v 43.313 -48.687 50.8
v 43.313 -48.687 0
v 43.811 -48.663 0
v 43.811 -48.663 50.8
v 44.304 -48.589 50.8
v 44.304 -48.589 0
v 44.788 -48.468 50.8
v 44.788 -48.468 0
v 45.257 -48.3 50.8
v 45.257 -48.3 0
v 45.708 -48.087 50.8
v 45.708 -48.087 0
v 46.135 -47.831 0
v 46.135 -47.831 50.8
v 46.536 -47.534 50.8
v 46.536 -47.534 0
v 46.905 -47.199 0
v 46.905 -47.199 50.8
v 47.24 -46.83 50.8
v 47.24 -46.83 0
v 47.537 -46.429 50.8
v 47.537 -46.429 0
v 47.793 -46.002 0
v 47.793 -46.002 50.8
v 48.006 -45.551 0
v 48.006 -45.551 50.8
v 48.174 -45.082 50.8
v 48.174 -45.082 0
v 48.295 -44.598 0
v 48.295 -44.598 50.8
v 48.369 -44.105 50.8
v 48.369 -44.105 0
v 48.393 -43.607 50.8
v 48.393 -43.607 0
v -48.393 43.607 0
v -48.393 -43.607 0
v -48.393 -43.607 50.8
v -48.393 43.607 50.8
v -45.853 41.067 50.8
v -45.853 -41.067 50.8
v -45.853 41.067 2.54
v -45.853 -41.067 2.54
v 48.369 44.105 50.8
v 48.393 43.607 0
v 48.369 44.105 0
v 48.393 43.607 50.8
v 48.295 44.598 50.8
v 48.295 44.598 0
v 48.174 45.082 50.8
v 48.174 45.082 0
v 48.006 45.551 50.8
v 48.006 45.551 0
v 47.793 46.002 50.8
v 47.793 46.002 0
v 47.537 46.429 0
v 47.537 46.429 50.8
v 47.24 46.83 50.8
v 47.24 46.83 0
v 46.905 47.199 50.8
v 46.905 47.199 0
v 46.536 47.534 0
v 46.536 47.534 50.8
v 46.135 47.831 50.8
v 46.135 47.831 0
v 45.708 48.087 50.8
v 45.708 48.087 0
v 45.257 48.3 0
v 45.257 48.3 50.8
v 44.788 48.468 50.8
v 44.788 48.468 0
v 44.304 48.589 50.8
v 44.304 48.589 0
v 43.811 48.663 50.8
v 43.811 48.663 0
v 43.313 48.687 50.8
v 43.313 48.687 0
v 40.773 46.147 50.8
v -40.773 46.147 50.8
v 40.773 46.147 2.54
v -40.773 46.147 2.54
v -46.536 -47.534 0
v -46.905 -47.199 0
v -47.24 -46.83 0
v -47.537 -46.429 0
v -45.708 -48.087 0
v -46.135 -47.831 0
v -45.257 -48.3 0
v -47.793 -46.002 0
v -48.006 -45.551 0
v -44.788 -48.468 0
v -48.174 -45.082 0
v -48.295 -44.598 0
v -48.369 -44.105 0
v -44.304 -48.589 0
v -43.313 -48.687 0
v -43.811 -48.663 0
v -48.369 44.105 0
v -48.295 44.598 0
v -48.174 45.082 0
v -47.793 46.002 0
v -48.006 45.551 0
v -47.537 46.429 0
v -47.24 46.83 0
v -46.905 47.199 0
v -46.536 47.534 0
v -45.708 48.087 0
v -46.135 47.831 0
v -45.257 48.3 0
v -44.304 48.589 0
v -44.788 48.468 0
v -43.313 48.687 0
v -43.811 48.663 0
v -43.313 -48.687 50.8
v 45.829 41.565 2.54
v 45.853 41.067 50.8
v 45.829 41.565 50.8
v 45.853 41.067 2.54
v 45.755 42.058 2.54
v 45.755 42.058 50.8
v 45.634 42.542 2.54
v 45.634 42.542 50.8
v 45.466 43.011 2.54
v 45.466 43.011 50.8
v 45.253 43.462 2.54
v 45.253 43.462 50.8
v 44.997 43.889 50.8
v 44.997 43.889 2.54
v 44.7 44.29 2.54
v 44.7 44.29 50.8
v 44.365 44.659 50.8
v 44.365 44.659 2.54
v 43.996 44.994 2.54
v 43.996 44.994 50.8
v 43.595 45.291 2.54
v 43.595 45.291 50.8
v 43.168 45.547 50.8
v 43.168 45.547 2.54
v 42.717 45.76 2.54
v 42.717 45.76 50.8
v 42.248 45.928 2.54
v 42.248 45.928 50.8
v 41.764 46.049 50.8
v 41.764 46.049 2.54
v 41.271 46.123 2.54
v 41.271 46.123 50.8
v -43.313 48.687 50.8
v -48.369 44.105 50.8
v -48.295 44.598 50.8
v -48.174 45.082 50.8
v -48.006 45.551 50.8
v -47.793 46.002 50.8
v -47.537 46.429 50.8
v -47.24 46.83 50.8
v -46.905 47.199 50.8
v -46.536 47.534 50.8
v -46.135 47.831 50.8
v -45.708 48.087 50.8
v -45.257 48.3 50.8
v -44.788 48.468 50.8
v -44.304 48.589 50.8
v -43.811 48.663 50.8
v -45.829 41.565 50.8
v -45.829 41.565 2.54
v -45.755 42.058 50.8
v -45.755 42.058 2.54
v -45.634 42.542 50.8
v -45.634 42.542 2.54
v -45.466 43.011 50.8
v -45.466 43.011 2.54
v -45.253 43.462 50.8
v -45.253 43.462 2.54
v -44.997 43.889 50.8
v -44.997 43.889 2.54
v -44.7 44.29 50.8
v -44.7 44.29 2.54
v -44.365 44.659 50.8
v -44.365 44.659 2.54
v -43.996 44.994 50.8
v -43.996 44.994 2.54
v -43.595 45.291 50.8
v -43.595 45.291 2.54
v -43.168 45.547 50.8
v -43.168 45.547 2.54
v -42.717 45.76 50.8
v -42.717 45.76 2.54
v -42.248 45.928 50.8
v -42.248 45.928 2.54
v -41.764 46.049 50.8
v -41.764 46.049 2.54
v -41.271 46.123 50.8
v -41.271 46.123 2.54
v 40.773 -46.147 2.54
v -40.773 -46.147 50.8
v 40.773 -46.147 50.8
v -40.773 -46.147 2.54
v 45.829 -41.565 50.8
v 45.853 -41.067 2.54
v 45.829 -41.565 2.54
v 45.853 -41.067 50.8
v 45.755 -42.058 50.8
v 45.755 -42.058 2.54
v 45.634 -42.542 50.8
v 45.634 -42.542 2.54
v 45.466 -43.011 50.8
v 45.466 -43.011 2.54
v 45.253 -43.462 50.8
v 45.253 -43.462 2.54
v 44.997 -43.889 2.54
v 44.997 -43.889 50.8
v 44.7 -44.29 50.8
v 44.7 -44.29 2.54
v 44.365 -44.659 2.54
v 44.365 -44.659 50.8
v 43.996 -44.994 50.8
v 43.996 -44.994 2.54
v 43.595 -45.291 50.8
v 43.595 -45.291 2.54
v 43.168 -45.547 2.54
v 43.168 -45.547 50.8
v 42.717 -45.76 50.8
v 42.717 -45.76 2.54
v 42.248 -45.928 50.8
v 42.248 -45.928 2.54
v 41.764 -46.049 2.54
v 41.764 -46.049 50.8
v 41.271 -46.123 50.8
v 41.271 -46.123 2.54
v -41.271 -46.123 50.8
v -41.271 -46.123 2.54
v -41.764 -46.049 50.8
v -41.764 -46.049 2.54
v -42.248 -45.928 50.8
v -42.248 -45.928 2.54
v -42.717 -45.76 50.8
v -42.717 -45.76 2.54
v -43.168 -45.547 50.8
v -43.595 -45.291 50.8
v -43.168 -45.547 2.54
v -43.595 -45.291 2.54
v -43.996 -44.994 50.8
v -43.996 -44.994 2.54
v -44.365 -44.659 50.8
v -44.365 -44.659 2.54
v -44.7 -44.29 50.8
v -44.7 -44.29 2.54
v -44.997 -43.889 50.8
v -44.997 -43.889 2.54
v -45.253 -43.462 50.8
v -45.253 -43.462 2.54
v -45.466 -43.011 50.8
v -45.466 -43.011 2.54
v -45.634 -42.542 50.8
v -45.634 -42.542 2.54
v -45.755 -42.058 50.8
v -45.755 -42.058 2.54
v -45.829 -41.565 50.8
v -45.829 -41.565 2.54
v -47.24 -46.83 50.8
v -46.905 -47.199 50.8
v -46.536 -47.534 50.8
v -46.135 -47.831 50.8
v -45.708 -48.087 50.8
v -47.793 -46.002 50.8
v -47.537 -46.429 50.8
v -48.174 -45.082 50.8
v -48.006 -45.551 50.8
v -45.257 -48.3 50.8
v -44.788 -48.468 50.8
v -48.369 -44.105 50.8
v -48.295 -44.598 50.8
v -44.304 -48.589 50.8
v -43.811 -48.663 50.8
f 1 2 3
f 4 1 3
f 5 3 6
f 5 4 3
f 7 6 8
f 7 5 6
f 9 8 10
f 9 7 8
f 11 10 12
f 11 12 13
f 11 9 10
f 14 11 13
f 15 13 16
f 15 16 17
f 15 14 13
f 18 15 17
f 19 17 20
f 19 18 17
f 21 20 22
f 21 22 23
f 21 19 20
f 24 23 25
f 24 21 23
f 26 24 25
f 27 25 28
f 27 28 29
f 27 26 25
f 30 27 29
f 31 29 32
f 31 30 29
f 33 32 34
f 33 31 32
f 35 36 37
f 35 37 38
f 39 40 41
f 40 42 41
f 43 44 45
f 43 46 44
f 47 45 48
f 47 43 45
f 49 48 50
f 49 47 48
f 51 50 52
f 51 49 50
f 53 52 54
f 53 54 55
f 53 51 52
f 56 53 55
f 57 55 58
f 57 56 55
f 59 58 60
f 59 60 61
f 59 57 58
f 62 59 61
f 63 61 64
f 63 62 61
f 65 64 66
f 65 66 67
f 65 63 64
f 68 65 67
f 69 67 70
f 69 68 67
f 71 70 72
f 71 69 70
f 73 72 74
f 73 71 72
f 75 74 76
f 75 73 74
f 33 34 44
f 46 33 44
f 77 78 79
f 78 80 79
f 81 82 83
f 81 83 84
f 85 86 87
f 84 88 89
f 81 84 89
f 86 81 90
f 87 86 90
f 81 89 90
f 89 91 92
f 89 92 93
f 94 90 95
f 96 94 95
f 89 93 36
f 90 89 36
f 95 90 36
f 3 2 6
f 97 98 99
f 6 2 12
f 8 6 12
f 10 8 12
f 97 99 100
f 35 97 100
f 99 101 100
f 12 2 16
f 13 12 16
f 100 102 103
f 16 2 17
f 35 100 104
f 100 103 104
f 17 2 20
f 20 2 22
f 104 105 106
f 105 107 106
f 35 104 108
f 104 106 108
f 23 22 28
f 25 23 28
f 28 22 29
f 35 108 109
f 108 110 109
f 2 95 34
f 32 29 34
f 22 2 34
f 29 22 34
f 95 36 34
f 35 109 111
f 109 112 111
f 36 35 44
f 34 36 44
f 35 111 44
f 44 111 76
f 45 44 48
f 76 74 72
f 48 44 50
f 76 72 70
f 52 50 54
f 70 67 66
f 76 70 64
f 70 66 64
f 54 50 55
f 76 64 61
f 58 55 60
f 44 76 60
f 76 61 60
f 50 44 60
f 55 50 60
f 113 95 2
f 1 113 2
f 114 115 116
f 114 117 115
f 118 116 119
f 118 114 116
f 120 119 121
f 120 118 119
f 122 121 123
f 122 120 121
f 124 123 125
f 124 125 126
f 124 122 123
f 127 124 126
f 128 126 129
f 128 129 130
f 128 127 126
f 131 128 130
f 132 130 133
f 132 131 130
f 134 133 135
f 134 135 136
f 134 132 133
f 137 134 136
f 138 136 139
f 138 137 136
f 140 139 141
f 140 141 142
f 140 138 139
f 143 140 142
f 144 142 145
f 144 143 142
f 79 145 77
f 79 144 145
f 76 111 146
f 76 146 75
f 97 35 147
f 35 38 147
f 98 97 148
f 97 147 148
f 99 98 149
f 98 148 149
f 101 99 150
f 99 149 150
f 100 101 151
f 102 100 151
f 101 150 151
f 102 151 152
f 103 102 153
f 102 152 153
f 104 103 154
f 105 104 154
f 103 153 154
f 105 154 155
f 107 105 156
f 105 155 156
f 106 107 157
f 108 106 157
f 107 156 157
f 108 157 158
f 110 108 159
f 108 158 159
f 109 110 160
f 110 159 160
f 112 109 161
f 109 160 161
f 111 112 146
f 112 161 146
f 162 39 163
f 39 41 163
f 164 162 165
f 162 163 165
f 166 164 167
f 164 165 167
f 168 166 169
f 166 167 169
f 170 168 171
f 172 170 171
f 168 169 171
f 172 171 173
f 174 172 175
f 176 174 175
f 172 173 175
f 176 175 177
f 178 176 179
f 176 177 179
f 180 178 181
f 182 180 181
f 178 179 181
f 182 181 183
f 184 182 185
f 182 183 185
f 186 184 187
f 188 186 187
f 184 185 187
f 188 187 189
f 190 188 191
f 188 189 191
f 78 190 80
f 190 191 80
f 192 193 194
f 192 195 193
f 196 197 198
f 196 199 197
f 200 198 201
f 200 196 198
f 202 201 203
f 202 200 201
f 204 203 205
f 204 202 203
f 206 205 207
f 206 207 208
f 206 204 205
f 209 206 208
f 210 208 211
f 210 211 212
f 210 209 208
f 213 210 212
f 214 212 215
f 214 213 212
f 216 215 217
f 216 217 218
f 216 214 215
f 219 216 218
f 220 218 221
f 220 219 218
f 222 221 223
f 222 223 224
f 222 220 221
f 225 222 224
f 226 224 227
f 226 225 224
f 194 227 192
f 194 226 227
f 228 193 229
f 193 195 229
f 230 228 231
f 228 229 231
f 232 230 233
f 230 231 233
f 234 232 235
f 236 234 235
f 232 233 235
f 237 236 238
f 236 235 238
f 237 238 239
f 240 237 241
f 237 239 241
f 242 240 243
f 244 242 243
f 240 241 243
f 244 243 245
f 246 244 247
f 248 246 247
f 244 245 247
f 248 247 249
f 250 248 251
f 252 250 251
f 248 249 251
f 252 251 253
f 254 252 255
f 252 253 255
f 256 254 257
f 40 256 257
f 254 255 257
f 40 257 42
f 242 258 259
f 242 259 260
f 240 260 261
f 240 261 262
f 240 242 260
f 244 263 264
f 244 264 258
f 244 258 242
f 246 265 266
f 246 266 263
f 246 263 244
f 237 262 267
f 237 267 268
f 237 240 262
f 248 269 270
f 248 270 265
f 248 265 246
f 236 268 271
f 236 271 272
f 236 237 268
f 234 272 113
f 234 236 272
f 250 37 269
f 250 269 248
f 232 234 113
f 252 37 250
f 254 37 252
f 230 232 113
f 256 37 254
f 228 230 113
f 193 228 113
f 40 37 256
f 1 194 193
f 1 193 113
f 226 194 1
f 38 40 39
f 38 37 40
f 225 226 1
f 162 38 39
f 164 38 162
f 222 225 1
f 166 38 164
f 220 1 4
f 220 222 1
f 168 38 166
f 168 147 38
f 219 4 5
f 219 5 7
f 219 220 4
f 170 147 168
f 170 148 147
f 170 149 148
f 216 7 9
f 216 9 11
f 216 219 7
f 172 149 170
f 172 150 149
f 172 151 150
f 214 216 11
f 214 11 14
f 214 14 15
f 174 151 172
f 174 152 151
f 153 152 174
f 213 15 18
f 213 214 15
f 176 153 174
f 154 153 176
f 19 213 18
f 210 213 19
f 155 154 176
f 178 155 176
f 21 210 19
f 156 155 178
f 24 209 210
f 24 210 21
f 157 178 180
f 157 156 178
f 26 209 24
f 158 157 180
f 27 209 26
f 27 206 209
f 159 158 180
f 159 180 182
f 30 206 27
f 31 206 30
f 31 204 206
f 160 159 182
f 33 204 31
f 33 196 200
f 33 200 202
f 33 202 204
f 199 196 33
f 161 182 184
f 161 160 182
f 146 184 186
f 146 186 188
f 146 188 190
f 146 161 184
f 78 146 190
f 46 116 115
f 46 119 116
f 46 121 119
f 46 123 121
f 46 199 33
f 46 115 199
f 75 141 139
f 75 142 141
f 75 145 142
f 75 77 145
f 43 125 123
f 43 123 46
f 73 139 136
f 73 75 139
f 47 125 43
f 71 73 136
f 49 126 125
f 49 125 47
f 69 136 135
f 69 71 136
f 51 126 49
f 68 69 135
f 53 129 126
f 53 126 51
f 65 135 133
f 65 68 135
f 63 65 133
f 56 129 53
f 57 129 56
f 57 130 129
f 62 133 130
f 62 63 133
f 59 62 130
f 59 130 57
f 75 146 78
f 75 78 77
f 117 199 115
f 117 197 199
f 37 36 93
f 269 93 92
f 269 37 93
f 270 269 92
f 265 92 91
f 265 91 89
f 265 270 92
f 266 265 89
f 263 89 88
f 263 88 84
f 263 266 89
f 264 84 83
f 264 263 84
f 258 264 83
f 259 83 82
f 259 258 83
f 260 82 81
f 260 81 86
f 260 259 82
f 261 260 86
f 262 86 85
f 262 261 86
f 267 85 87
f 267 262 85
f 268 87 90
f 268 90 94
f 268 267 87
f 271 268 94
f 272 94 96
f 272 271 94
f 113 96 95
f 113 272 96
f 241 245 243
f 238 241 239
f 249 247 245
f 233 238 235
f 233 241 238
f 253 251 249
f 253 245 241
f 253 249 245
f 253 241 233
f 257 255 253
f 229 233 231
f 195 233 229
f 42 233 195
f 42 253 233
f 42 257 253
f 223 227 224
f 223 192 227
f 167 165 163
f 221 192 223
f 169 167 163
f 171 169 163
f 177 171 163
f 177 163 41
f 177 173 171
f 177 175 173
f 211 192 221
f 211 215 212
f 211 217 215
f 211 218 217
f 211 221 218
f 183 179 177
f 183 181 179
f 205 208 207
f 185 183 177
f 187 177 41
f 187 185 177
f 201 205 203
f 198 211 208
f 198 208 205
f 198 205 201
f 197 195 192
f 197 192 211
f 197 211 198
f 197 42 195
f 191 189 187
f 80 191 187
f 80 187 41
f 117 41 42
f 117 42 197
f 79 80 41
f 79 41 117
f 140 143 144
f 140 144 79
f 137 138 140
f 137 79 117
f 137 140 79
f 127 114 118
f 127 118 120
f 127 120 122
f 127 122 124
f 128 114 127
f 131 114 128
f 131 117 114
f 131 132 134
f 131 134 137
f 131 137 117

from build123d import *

# Parameters (mm, degrees)
F0_W     = 96.7861413956
F0_H     = 97.374163568
F1_DEPTH = 50.8
F2_T     = -2.54
F3_R     = 5.08
F4_R     = 5.08


with BuildPart() as f1:
    # F0 (on Top) → F1 (new body)
    with BuildSketch(Plane.XY):
        Rectangle(F0_W, F0_H)
    extrude(amount=F1_DEPTH)

    # F2
    f2_openings = [f1.faces().sort_by_distance(p)[0] for p in [
        (0, 0, 50.8),
    ]]
    offset(amount=F2_T, openings=f2_openings)

    # F3
    f3_edges = [f1.edges().sort_by_distance(p)[0] for p in [
        (-48.393071, -48.687082, 25.4),
        (-48.393071, 48.687082, 25.4),
        (48.393071, 48.687082, 25.4),
        (48.393071, -48.687082, 25.4),
    ]]
    fillet(f3_edges, radius=F3_R)

    # F4
    f4_edges = [f1.edges().sort_by_distance(p)[0] for p in [
        (-45.853071, -46.147082, 26.67),
        (-45.853071, 46.147082, 26.67),
        (45.853071, -46.147082, 26.67),
        (45.853071, 46.147082, 26.67),
    ]]
    fillet(f4_edges, radius=F4_R)


solid = f1.part
